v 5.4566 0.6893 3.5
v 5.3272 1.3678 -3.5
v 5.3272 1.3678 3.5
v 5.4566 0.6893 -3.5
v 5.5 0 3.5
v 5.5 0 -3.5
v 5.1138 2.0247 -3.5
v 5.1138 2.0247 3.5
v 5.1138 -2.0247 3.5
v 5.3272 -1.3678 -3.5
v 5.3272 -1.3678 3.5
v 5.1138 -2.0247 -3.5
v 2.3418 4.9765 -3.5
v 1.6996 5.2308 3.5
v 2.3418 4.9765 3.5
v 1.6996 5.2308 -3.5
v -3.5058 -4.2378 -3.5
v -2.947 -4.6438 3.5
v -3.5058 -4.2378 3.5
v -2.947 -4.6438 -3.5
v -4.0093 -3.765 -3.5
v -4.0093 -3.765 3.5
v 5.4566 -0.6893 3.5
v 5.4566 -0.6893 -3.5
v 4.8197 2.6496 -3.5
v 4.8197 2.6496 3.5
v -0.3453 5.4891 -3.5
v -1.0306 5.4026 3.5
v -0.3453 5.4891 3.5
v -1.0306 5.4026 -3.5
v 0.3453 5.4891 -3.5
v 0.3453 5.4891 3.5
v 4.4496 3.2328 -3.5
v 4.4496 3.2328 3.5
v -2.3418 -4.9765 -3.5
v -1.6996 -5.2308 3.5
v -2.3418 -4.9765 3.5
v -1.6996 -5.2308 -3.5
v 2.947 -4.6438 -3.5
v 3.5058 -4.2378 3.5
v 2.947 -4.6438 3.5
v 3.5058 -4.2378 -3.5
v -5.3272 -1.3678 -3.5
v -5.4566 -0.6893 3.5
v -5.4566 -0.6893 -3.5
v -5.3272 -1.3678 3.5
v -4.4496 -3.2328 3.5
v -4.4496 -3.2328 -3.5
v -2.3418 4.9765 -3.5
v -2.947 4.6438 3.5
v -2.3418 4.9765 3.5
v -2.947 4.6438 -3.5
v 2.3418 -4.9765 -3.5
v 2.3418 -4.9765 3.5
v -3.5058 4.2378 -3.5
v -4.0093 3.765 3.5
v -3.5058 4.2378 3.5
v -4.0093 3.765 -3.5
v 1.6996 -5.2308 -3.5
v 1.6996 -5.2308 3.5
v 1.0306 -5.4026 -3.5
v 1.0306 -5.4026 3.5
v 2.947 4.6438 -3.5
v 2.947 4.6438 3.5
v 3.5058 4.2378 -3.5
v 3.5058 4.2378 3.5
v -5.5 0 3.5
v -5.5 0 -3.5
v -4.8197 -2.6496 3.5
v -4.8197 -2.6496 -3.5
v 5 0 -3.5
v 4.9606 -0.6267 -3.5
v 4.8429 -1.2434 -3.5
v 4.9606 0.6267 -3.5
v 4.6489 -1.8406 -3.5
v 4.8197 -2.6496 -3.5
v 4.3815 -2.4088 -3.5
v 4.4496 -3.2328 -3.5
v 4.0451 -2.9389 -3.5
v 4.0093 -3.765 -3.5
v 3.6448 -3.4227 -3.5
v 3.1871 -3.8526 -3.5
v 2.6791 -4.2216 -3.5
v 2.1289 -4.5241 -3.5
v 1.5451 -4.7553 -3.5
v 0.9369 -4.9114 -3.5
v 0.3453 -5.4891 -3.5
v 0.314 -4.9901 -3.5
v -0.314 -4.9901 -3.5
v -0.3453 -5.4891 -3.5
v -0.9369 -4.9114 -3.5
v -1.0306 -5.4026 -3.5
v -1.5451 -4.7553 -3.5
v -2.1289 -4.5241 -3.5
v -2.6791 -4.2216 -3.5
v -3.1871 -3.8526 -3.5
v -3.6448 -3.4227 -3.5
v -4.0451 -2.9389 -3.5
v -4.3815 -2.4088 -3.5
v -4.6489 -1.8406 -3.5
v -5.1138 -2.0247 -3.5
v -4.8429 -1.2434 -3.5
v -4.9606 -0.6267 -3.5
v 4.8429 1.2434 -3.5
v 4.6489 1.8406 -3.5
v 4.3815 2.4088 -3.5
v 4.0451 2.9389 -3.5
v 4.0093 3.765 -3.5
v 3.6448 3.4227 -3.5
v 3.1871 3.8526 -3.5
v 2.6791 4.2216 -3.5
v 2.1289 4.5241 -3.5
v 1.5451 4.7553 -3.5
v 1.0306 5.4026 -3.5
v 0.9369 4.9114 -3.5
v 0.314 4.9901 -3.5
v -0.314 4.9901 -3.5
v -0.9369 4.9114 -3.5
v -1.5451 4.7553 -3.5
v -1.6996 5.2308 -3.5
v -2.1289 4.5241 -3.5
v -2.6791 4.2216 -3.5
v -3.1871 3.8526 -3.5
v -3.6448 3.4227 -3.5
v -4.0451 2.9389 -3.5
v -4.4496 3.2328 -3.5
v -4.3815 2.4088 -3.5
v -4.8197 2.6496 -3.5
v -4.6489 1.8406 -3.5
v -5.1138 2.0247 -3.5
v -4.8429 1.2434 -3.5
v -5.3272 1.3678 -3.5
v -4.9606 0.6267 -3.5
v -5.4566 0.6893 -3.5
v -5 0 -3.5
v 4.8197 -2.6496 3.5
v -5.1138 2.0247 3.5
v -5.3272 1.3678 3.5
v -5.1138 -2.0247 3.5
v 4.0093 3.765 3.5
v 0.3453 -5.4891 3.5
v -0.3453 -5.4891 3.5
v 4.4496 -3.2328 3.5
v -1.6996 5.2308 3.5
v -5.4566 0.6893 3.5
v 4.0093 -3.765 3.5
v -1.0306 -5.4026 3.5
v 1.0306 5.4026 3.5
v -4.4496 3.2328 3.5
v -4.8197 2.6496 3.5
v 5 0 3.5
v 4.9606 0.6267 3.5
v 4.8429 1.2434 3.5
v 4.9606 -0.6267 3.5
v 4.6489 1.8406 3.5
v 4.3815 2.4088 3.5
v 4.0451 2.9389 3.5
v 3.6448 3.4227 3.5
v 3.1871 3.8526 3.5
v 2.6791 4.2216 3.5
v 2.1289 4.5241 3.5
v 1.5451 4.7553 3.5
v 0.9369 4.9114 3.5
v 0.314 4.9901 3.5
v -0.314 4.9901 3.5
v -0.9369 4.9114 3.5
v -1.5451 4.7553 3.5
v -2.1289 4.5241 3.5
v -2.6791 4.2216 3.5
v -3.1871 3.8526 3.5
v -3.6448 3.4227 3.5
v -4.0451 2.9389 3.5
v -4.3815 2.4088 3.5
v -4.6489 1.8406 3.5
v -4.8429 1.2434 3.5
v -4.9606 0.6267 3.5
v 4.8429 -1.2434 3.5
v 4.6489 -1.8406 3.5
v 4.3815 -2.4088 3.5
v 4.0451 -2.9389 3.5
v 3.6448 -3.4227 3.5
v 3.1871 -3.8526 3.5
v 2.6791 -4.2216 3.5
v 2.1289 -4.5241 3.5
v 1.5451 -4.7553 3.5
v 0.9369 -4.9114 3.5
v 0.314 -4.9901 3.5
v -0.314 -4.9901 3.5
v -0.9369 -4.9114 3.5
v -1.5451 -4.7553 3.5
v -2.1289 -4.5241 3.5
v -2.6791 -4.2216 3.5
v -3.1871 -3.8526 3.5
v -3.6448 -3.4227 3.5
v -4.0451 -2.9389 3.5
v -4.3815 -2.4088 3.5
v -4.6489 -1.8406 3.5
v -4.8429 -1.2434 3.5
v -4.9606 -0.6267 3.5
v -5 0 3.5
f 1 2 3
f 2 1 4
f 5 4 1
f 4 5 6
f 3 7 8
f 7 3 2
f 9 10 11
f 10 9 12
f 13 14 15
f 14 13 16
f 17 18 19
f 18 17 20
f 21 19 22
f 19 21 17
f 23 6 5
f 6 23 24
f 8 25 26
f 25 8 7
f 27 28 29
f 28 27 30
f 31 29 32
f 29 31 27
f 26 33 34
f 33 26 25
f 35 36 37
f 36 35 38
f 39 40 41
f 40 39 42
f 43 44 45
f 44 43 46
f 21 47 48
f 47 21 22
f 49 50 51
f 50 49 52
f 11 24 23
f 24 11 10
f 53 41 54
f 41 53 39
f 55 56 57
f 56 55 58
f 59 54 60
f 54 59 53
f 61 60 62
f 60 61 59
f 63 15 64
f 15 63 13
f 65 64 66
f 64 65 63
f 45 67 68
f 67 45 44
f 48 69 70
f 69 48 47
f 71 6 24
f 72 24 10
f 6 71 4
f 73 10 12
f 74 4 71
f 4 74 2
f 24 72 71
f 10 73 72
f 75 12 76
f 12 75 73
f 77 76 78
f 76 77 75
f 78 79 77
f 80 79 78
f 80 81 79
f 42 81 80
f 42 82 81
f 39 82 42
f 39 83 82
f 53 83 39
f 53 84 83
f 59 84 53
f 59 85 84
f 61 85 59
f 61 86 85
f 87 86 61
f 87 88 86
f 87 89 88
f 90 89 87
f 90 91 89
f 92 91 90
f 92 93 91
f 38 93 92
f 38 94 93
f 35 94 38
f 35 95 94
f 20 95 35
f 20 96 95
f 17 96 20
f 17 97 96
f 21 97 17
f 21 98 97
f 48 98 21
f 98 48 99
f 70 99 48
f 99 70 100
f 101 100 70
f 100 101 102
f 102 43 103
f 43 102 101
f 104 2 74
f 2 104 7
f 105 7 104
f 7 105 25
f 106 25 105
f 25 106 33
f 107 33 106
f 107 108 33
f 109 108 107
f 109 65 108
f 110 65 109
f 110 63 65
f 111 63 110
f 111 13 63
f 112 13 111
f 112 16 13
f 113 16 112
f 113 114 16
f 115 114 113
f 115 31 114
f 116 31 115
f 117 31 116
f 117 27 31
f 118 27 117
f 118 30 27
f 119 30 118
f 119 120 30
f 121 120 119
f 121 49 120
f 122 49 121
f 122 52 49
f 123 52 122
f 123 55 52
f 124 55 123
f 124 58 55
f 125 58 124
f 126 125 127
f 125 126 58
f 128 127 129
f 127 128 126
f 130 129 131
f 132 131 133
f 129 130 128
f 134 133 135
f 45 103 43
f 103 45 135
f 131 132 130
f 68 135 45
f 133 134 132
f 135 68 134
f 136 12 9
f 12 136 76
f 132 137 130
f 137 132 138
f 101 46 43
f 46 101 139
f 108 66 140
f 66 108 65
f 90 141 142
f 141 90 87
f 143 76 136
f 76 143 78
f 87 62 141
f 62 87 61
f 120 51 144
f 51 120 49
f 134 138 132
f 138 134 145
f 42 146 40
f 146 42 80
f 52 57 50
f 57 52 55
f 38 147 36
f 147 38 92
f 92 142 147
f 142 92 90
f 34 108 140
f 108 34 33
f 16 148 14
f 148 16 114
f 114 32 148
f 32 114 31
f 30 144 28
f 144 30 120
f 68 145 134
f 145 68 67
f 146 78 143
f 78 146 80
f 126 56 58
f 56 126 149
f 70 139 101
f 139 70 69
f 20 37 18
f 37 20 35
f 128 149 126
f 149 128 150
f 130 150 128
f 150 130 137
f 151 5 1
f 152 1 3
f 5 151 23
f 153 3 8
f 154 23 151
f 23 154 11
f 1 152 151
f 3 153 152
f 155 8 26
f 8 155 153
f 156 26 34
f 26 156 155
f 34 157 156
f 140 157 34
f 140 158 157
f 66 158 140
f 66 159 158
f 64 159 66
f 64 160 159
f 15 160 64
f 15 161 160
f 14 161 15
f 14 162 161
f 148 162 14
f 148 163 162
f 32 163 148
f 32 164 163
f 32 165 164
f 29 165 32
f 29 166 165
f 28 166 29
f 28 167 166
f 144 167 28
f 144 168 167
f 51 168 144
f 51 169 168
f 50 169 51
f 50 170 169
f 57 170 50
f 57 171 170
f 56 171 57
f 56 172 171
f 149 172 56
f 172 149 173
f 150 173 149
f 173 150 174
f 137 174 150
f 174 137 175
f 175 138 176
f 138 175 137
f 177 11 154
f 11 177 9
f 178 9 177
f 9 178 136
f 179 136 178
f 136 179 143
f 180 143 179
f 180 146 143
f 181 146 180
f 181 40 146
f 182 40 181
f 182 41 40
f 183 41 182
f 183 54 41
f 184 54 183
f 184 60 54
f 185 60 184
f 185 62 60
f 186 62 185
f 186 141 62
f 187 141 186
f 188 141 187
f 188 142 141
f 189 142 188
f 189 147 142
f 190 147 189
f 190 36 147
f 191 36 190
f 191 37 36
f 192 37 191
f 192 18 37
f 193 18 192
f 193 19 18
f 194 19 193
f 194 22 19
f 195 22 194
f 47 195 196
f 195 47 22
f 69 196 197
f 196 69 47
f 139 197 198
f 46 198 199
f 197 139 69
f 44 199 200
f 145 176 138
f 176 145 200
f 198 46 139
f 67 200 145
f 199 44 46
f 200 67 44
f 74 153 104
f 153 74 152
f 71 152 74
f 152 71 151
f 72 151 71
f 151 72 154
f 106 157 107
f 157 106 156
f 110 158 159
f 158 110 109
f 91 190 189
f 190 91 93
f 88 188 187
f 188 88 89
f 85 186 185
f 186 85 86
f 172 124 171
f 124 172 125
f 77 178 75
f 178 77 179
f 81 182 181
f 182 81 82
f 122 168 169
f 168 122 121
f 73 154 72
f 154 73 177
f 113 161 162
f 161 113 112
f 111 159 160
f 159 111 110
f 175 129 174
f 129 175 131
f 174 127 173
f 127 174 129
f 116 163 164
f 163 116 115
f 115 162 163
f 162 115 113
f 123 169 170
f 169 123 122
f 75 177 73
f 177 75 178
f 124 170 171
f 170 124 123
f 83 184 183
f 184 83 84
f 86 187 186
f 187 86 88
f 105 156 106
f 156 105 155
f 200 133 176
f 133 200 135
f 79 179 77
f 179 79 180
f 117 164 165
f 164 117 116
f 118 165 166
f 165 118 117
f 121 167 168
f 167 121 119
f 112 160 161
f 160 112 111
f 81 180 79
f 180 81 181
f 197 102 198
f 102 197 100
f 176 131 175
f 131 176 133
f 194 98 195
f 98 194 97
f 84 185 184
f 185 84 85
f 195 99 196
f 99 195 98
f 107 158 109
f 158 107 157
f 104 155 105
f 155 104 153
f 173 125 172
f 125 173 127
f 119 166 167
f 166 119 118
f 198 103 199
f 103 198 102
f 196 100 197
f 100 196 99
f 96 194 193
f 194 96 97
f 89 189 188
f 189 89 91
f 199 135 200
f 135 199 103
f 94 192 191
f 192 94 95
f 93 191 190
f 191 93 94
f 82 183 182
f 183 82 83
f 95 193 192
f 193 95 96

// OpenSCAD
$fn = 50;


difference() {
	union() {
		translate(v = [0, 0, -3.5000000000]) {
			cylinder(h = 7, r = 5.5000000000);
		}
	}
	union() {
		translate(v = [0, 0, -100.0000000000]) {
			cylinder(h = 200, r = 5.0000000000);
		}
	}
}
